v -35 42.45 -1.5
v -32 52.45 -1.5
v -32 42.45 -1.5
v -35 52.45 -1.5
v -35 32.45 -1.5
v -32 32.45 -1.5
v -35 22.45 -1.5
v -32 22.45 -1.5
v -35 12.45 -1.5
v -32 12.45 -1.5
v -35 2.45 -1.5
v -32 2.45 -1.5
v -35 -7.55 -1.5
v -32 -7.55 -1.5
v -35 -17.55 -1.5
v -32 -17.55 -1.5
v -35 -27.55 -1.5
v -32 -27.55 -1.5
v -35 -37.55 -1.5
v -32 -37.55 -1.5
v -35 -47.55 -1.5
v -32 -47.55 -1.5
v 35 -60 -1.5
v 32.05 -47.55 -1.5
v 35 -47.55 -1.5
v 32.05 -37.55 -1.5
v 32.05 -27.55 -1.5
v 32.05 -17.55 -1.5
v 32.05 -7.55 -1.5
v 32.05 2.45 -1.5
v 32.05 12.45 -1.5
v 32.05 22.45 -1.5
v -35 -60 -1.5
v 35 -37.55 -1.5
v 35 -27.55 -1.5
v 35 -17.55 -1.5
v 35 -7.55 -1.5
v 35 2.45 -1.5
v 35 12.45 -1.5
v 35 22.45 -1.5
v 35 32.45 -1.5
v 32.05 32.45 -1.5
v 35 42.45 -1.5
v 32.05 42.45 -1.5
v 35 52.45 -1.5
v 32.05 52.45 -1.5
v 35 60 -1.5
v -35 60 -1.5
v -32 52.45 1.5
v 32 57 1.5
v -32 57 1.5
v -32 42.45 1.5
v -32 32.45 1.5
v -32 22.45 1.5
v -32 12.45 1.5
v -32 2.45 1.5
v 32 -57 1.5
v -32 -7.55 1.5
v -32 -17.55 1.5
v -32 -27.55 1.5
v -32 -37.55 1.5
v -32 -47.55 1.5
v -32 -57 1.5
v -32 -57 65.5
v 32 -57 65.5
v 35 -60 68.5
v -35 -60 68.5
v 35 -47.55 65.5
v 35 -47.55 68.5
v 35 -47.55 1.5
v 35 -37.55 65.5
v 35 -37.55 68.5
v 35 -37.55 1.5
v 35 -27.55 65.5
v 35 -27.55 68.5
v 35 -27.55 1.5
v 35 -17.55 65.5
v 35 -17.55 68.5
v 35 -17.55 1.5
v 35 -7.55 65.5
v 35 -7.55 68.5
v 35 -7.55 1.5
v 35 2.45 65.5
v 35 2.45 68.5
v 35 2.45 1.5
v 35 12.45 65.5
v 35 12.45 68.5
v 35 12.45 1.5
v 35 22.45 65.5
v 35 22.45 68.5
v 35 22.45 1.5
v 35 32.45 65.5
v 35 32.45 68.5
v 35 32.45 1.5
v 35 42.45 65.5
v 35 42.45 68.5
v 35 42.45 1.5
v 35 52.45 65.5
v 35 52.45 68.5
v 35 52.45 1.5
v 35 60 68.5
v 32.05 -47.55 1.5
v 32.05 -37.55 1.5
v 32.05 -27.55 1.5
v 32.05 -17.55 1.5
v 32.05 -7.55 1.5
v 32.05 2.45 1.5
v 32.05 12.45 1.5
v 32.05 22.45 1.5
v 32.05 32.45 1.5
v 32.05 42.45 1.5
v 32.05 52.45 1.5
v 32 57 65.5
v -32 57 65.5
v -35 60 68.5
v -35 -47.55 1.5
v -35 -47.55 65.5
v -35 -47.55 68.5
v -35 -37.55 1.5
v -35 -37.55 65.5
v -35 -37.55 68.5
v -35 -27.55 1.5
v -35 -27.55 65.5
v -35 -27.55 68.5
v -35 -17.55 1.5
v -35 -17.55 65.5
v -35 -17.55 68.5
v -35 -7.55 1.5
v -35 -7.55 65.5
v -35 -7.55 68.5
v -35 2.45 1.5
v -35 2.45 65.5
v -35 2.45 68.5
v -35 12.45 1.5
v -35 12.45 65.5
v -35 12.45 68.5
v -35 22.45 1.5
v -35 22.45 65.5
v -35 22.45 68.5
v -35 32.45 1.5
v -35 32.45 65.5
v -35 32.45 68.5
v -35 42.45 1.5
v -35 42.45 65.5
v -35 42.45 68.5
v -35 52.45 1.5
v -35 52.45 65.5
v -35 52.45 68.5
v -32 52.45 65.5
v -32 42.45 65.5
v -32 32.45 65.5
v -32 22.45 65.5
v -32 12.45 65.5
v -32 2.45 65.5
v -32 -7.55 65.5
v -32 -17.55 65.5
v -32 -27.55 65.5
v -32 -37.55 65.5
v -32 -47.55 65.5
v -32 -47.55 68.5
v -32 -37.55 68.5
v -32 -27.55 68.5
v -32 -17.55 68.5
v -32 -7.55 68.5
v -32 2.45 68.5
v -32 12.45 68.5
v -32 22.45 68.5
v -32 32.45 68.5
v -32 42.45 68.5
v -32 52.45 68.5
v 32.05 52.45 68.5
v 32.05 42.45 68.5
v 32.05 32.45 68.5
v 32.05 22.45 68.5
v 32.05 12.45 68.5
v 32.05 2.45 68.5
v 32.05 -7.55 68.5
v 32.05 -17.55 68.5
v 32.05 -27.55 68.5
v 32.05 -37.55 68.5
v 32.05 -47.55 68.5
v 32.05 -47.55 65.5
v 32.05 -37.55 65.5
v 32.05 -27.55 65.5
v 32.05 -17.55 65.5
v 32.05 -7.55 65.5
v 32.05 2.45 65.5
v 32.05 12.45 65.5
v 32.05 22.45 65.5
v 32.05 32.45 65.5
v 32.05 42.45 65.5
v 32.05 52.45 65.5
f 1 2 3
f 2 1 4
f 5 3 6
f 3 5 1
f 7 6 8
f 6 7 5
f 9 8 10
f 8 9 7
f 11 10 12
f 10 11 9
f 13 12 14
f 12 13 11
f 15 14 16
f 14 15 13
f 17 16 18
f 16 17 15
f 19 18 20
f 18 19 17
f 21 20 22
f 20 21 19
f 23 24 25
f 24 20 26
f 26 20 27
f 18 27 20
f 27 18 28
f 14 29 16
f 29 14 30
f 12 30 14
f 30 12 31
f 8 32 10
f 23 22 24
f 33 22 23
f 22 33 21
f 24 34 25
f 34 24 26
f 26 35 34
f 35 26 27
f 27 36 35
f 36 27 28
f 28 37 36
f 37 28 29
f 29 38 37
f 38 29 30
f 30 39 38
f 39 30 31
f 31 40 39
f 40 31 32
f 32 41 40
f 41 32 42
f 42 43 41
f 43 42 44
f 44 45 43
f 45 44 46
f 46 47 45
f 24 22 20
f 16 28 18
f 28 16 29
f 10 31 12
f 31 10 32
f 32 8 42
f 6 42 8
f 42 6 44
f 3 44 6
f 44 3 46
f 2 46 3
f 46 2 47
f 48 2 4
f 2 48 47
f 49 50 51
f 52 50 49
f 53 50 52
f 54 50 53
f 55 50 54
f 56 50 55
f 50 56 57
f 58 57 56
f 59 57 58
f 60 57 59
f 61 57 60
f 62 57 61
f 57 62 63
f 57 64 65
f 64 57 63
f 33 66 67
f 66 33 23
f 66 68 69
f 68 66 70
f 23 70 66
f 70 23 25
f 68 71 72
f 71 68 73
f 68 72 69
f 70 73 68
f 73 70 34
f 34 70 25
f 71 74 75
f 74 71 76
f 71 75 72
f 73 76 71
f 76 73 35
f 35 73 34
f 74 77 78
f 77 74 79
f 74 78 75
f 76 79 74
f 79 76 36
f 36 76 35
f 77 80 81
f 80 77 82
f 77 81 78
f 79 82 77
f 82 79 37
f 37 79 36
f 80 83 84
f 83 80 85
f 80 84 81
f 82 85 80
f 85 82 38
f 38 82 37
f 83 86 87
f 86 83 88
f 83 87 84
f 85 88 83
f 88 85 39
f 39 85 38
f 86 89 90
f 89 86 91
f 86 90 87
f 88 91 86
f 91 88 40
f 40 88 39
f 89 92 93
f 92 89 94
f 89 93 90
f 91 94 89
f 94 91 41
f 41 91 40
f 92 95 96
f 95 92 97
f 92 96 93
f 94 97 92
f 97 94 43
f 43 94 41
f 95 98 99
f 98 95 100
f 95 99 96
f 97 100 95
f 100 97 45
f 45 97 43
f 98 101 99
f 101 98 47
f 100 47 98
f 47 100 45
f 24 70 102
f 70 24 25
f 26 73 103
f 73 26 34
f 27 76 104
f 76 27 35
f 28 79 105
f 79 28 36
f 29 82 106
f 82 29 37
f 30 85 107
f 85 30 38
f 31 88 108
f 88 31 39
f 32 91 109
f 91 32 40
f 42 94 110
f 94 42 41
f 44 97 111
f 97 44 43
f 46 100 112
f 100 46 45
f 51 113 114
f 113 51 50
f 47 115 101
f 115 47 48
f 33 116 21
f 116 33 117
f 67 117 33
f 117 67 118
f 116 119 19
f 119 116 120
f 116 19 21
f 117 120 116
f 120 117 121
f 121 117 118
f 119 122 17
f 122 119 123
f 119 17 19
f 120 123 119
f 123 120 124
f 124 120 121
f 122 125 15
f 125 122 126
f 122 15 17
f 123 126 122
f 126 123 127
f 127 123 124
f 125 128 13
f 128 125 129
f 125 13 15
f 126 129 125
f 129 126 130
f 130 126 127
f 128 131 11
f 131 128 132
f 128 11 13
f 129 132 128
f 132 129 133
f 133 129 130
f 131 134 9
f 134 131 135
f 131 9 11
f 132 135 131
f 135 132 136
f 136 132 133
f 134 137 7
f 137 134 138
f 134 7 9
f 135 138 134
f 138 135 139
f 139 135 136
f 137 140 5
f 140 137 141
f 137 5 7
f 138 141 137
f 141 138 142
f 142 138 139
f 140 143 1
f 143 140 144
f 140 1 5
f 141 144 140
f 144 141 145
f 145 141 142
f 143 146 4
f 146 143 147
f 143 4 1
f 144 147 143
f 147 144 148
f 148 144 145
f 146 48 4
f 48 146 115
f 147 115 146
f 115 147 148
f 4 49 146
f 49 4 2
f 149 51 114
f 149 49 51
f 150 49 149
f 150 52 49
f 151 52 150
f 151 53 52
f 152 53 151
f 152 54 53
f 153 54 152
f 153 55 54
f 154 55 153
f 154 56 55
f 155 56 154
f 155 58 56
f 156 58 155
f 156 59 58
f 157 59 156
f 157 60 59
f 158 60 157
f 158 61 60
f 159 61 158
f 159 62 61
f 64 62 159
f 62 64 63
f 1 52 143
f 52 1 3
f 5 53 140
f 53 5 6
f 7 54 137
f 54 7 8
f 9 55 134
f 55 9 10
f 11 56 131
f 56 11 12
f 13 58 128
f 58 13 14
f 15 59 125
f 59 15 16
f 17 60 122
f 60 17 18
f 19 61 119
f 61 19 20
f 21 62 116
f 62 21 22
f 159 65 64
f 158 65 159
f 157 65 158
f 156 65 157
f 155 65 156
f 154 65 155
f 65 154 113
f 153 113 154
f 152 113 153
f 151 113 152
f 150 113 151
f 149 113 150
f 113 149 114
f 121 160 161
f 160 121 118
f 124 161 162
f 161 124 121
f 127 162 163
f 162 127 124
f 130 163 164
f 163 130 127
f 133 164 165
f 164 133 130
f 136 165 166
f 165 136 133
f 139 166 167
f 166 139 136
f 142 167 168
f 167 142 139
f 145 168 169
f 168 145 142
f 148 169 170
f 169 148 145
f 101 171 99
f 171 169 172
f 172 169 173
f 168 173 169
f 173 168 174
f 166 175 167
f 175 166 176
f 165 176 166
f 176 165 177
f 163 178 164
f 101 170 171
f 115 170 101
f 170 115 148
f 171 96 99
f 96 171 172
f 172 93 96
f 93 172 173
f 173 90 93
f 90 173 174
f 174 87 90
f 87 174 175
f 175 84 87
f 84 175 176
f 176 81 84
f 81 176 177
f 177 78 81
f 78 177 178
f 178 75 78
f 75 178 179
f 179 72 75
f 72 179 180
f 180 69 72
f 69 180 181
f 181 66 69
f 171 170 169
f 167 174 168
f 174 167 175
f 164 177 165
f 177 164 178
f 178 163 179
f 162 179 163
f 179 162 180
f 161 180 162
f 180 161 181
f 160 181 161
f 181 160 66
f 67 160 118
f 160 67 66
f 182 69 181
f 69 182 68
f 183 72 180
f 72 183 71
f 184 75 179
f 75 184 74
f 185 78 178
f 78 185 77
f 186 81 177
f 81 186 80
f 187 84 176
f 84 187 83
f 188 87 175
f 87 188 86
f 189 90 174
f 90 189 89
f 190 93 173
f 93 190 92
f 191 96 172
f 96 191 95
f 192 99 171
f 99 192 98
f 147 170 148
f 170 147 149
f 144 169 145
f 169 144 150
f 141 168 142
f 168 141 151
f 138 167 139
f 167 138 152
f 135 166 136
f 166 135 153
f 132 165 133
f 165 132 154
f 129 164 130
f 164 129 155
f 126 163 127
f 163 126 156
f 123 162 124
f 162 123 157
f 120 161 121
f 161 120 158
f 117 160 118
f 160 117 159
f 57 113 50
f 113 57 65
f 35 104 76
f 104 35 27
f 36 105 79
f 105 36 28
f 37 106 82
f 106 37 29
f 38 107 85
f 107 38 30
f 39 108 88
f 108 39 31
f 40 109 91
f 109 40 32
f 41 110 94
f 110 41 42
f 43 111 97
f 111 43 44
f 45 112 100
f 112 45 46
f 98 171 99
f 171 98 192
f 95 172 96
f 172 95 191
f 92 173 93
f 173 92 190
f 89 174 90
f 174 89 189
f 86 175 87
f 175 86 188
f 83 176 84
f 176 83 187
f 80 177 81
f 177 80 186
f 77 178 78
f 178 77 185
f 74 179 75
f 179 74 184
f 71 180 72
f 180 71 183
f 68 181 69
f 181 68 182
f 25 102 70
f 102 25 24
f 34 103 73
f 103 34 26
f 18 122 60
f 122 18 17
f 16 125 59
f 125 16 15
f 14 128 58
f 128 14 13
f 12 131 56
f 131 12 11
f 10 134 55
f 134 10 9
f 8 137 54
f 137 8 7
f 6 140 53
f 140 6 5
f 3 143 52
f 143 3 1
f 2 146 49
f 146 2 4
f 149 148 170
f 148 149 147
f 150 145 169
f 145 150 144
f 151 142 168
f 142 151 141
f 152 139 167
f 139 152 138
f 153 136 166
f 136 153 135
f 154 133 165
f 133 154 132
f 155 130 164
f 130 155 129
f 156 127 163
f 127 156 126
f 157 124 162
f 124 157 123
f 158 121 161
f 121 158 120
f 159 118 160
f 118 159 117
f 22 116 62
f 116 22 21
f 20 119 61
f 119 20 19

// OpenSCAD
//Create a laser cut box with finger joints
/* Version 2.1.1 3 August 2014
  *cut depth may be slightly too large due to kerf error

*/

/* [Box OUTSIDE Dimensions] */
//Box Width (X) 
bX=70; 
//Box Depth (Y)
bY=120; 
//Box Height (Z)
bZ=70; 
//Material Thickness
cutD=3; 
//include a lid?
lid=1; //[1:Lid, 0:No Lid]

/* [Finger Width] */
//Finger  width (cutW < 1/3 shortest side)
cutW=5;//[3:20]
//Laser kerf (1/2 inside, 1/2 outside of laser path)
kerf=0.1;

/* [Layout] */
//separation of finished pieces
separation=1; 
//transparency of 3D model
alpha=50; //[1:100]
//2D or 3D Layout
2D=0; //[1:2D for DXF, 0:3D for STL]

/* [Hidden] */
//Calculate the maximum number of tabs and slots
maxDivX=floor(bX/cutW);
maxDivY=floor(bY/cutW);
maxDivZ=floor(bZ/cutW);

alp=1-alpha/100;

//calculate the maximum number of usable divisions 

//NB! the maximum usable divisions MUST be odd
uDivX= (maxDivX%2)==0 ? maxDivX-3 : maxDivX-2;
uDivY= (maxDivY%2)==0 ? maxDivY-3 : maxDivY-2;
uDivZ= (maxDivZ%2)==0 ? maxDivZ-3 : maxDivZ-2;

//cuts that fall completely inside the edge
module insideCuts(len, uDiv) {
  numTabs=floor(uDiv/2);
  numSlots=ceil(uDiv/2);
  
  //draw out rectangels for slots
  for (i=[0:numSlots-1]) {
    translate([i*(cutW*2)+kerf/2, 0, 0])
      square([cutW-kerf, cutD]);
      //Orignial: square([cutW-kerf, cutD-kerf/2]);
  }
}

//cuts that fall at the end of an edge
module outsideCuts(len, uDiv, endCut) {
  numTabs=ceil(uDiv/2);
  numSlots=floor(uDiv/2);
  //padding - shift all the slots by the amount equal to the end cut plus one division
  padding=endCut+cutW;
  
  //Consider removing the kerf here and below

  //first endcut
  square([endCut+kerf/2, cutD]);
  //Original: square([endCut+kerf/2, cutD-kerf/2]);
  
  //draw all the normal slots plus the last endcut
  for (i=[0:numSlots]) {
    if (i < numSlots) {
      translate([i*(cutW*2)+padding-kerf/2, 0, 0])
        square([cutW+kerf, cutD]);
        //Original: square([cutW+kerf, cutD-kerf/2]);
    } else {
      translate([i*(cutW*2)+padding-kerf/2, 0, 0])
        square([endCut+kerf/2, cutD]);
        //Original: square([endCut+kerf/2, cutD-kerf/2]);
    }

  }
}

//face A (X, Z)
module faceA() {
  difference() {
    square([bX, bZ], center=true);
    //X+/- edge (X axis in OpenSCAD)

    if (lid) {
    translate([-uDivX*cutW/2, bZ/2-cutD, 0])
    //original: translate([-uDivX*cutW/2, bZ/2-cutD+kerf/2, 0])
      insideCuts(bX, uDivX);
    }
    translate([-uDivX*cutW/2, -bZ/2, 0])
      insideCuts(bX, uDivX);

    //Z+/- edge (Y axis in OpenSCAD)
    translate([bX/2-cutD+kerf/2, uDivZ*cutW/2, 0]) rotate([0, 0, -90])
      insideCuts(bZ, uDivZ);
    translate([-bX/2, uDivZ*cutW/2, 0]) rotate([0, 0, -90])
      insideCuts(bZ, uDivZ);
  }
} //end faceA


module faceB() {
  endCutX=(bX-uDivX*cutW)/2;
  difference() {
    square([bX, bY], center=true);
    //X+/- edge (X axis in OpenSCAD)
    translate([(-uDivX*cutW/2)-endCutX, bY/2-cutD, 0])
    //Original: #translate([(-uDivX*cutW/2)-endCutX, bY/2-cutD+kerf/2, 0])
      outsideCuts(bX, uDivX, endCutX);
    translate([(-uDivX*cutW/2)-endCutX, -bY/2, 0])
      outsideCuts(bX, uDivX, endCutX);

    //Y+/- edge (Y axis in OpenSCAD)
    translate([bX/2-cutD+kerf/2, uDivY*cutW/2, 0]) rotate([0, 0, -90])
      insideCuts(bY, uDivY);
    translate([-bX/2, uDivY*cutW/2, 0]) rotate([0, 0, -90])
      insideCuts(bY, uDivY);
      
  }
}

module faceC() {
  endCutY=(bY-uDivY*cutW)/2;
  endCutZ=(bZ-uDivZ*cutW)/2;

  difference() {
    square([bY, bZ], center=true);
    //Y+/- edge (X axis in OpenSCAD)
    if (lid) {
    translate([(-uDivY*cutW/2)-endCutY, bZ/2-cutD, 0])
    //Original: #translate([(-uDivY*cutW/2)-endCutY, bZ/2-cutD+kerf/2, 0])
      outsideCuts(bY, uDivY, endCutY);
    }
    translate([(-uDivY*cutW/2)-endCutY, -bZ/2, 0])
      outsideCuts(bY, uDivY, endCutY);

    //Z+/- edge (Y axis in OpenSCAD)
    translate([-bY/2, (uDivZ*cutW/2)+endCutZ, 0]) rotate([0, 0, -90])
      outsideCuts(bZ, uDivZ, endCutZ);
    translate([bY/2-cutD+kerf/2, (uDivZ*cutW/2)+endCutZ, 0]) rotate([0, 0, -90])
      outsideCuts(bZ, uDivZ, endCutZ);
  }
}

module layout2D() {
  faceA();
  translate([0, -bZ/2-bY/2-separation, 0])
    color("green") faceB();
  translate([bX/2+bY/2+separation, 0, 0])  
    color("blue") faceC();
}

module assemble3D() {
  //amount to shift for cut depth
  D=cutD/2;
  
  color("aqua", alpha=alp) 
    linear_extrude(height=cutD, center=true) faceB();
  if (lid) {  
  color("green", alpha=alp) 
    translate([0, 0, bZ-cutD])
    linear_extrude(height=cutD, center=true) faceB();
  }

  //faceA +/-
  color("red", alpha=alp)  
    translate([0, bY/2-D, bZ/2-D]) rotate([90, 0, 0])
    linear_extrude(height=cutD, center=true) faceA();
  color("gold", alpha=alp)
    translate([0, -bY/2+D, bZ/2-D]) rotate([90, 0, 0])
    linear_extrude(height=cutD, center=true) faceA();

  //FaceC +/-
  color("blue", alpha=alp)
    translate([bX/2-D, 0, bZ/2-D]) rotate([90, 0, 90])
    linear_extrude(height=cutD, center=true) faceC();
  color("purple", alpha=alp)
    translate([-bX/2+D, 0, bZ/2-D]) rotate([90, 0, 90])
    linear_extrude(height=cutD, center=true) faceC();
}

//Layout the model
if (2D) {
	layout2D();
	translate([bX+bY+separation*2, 0, 0])  
  		layout2D();
} else {
	assemble3D();
}
